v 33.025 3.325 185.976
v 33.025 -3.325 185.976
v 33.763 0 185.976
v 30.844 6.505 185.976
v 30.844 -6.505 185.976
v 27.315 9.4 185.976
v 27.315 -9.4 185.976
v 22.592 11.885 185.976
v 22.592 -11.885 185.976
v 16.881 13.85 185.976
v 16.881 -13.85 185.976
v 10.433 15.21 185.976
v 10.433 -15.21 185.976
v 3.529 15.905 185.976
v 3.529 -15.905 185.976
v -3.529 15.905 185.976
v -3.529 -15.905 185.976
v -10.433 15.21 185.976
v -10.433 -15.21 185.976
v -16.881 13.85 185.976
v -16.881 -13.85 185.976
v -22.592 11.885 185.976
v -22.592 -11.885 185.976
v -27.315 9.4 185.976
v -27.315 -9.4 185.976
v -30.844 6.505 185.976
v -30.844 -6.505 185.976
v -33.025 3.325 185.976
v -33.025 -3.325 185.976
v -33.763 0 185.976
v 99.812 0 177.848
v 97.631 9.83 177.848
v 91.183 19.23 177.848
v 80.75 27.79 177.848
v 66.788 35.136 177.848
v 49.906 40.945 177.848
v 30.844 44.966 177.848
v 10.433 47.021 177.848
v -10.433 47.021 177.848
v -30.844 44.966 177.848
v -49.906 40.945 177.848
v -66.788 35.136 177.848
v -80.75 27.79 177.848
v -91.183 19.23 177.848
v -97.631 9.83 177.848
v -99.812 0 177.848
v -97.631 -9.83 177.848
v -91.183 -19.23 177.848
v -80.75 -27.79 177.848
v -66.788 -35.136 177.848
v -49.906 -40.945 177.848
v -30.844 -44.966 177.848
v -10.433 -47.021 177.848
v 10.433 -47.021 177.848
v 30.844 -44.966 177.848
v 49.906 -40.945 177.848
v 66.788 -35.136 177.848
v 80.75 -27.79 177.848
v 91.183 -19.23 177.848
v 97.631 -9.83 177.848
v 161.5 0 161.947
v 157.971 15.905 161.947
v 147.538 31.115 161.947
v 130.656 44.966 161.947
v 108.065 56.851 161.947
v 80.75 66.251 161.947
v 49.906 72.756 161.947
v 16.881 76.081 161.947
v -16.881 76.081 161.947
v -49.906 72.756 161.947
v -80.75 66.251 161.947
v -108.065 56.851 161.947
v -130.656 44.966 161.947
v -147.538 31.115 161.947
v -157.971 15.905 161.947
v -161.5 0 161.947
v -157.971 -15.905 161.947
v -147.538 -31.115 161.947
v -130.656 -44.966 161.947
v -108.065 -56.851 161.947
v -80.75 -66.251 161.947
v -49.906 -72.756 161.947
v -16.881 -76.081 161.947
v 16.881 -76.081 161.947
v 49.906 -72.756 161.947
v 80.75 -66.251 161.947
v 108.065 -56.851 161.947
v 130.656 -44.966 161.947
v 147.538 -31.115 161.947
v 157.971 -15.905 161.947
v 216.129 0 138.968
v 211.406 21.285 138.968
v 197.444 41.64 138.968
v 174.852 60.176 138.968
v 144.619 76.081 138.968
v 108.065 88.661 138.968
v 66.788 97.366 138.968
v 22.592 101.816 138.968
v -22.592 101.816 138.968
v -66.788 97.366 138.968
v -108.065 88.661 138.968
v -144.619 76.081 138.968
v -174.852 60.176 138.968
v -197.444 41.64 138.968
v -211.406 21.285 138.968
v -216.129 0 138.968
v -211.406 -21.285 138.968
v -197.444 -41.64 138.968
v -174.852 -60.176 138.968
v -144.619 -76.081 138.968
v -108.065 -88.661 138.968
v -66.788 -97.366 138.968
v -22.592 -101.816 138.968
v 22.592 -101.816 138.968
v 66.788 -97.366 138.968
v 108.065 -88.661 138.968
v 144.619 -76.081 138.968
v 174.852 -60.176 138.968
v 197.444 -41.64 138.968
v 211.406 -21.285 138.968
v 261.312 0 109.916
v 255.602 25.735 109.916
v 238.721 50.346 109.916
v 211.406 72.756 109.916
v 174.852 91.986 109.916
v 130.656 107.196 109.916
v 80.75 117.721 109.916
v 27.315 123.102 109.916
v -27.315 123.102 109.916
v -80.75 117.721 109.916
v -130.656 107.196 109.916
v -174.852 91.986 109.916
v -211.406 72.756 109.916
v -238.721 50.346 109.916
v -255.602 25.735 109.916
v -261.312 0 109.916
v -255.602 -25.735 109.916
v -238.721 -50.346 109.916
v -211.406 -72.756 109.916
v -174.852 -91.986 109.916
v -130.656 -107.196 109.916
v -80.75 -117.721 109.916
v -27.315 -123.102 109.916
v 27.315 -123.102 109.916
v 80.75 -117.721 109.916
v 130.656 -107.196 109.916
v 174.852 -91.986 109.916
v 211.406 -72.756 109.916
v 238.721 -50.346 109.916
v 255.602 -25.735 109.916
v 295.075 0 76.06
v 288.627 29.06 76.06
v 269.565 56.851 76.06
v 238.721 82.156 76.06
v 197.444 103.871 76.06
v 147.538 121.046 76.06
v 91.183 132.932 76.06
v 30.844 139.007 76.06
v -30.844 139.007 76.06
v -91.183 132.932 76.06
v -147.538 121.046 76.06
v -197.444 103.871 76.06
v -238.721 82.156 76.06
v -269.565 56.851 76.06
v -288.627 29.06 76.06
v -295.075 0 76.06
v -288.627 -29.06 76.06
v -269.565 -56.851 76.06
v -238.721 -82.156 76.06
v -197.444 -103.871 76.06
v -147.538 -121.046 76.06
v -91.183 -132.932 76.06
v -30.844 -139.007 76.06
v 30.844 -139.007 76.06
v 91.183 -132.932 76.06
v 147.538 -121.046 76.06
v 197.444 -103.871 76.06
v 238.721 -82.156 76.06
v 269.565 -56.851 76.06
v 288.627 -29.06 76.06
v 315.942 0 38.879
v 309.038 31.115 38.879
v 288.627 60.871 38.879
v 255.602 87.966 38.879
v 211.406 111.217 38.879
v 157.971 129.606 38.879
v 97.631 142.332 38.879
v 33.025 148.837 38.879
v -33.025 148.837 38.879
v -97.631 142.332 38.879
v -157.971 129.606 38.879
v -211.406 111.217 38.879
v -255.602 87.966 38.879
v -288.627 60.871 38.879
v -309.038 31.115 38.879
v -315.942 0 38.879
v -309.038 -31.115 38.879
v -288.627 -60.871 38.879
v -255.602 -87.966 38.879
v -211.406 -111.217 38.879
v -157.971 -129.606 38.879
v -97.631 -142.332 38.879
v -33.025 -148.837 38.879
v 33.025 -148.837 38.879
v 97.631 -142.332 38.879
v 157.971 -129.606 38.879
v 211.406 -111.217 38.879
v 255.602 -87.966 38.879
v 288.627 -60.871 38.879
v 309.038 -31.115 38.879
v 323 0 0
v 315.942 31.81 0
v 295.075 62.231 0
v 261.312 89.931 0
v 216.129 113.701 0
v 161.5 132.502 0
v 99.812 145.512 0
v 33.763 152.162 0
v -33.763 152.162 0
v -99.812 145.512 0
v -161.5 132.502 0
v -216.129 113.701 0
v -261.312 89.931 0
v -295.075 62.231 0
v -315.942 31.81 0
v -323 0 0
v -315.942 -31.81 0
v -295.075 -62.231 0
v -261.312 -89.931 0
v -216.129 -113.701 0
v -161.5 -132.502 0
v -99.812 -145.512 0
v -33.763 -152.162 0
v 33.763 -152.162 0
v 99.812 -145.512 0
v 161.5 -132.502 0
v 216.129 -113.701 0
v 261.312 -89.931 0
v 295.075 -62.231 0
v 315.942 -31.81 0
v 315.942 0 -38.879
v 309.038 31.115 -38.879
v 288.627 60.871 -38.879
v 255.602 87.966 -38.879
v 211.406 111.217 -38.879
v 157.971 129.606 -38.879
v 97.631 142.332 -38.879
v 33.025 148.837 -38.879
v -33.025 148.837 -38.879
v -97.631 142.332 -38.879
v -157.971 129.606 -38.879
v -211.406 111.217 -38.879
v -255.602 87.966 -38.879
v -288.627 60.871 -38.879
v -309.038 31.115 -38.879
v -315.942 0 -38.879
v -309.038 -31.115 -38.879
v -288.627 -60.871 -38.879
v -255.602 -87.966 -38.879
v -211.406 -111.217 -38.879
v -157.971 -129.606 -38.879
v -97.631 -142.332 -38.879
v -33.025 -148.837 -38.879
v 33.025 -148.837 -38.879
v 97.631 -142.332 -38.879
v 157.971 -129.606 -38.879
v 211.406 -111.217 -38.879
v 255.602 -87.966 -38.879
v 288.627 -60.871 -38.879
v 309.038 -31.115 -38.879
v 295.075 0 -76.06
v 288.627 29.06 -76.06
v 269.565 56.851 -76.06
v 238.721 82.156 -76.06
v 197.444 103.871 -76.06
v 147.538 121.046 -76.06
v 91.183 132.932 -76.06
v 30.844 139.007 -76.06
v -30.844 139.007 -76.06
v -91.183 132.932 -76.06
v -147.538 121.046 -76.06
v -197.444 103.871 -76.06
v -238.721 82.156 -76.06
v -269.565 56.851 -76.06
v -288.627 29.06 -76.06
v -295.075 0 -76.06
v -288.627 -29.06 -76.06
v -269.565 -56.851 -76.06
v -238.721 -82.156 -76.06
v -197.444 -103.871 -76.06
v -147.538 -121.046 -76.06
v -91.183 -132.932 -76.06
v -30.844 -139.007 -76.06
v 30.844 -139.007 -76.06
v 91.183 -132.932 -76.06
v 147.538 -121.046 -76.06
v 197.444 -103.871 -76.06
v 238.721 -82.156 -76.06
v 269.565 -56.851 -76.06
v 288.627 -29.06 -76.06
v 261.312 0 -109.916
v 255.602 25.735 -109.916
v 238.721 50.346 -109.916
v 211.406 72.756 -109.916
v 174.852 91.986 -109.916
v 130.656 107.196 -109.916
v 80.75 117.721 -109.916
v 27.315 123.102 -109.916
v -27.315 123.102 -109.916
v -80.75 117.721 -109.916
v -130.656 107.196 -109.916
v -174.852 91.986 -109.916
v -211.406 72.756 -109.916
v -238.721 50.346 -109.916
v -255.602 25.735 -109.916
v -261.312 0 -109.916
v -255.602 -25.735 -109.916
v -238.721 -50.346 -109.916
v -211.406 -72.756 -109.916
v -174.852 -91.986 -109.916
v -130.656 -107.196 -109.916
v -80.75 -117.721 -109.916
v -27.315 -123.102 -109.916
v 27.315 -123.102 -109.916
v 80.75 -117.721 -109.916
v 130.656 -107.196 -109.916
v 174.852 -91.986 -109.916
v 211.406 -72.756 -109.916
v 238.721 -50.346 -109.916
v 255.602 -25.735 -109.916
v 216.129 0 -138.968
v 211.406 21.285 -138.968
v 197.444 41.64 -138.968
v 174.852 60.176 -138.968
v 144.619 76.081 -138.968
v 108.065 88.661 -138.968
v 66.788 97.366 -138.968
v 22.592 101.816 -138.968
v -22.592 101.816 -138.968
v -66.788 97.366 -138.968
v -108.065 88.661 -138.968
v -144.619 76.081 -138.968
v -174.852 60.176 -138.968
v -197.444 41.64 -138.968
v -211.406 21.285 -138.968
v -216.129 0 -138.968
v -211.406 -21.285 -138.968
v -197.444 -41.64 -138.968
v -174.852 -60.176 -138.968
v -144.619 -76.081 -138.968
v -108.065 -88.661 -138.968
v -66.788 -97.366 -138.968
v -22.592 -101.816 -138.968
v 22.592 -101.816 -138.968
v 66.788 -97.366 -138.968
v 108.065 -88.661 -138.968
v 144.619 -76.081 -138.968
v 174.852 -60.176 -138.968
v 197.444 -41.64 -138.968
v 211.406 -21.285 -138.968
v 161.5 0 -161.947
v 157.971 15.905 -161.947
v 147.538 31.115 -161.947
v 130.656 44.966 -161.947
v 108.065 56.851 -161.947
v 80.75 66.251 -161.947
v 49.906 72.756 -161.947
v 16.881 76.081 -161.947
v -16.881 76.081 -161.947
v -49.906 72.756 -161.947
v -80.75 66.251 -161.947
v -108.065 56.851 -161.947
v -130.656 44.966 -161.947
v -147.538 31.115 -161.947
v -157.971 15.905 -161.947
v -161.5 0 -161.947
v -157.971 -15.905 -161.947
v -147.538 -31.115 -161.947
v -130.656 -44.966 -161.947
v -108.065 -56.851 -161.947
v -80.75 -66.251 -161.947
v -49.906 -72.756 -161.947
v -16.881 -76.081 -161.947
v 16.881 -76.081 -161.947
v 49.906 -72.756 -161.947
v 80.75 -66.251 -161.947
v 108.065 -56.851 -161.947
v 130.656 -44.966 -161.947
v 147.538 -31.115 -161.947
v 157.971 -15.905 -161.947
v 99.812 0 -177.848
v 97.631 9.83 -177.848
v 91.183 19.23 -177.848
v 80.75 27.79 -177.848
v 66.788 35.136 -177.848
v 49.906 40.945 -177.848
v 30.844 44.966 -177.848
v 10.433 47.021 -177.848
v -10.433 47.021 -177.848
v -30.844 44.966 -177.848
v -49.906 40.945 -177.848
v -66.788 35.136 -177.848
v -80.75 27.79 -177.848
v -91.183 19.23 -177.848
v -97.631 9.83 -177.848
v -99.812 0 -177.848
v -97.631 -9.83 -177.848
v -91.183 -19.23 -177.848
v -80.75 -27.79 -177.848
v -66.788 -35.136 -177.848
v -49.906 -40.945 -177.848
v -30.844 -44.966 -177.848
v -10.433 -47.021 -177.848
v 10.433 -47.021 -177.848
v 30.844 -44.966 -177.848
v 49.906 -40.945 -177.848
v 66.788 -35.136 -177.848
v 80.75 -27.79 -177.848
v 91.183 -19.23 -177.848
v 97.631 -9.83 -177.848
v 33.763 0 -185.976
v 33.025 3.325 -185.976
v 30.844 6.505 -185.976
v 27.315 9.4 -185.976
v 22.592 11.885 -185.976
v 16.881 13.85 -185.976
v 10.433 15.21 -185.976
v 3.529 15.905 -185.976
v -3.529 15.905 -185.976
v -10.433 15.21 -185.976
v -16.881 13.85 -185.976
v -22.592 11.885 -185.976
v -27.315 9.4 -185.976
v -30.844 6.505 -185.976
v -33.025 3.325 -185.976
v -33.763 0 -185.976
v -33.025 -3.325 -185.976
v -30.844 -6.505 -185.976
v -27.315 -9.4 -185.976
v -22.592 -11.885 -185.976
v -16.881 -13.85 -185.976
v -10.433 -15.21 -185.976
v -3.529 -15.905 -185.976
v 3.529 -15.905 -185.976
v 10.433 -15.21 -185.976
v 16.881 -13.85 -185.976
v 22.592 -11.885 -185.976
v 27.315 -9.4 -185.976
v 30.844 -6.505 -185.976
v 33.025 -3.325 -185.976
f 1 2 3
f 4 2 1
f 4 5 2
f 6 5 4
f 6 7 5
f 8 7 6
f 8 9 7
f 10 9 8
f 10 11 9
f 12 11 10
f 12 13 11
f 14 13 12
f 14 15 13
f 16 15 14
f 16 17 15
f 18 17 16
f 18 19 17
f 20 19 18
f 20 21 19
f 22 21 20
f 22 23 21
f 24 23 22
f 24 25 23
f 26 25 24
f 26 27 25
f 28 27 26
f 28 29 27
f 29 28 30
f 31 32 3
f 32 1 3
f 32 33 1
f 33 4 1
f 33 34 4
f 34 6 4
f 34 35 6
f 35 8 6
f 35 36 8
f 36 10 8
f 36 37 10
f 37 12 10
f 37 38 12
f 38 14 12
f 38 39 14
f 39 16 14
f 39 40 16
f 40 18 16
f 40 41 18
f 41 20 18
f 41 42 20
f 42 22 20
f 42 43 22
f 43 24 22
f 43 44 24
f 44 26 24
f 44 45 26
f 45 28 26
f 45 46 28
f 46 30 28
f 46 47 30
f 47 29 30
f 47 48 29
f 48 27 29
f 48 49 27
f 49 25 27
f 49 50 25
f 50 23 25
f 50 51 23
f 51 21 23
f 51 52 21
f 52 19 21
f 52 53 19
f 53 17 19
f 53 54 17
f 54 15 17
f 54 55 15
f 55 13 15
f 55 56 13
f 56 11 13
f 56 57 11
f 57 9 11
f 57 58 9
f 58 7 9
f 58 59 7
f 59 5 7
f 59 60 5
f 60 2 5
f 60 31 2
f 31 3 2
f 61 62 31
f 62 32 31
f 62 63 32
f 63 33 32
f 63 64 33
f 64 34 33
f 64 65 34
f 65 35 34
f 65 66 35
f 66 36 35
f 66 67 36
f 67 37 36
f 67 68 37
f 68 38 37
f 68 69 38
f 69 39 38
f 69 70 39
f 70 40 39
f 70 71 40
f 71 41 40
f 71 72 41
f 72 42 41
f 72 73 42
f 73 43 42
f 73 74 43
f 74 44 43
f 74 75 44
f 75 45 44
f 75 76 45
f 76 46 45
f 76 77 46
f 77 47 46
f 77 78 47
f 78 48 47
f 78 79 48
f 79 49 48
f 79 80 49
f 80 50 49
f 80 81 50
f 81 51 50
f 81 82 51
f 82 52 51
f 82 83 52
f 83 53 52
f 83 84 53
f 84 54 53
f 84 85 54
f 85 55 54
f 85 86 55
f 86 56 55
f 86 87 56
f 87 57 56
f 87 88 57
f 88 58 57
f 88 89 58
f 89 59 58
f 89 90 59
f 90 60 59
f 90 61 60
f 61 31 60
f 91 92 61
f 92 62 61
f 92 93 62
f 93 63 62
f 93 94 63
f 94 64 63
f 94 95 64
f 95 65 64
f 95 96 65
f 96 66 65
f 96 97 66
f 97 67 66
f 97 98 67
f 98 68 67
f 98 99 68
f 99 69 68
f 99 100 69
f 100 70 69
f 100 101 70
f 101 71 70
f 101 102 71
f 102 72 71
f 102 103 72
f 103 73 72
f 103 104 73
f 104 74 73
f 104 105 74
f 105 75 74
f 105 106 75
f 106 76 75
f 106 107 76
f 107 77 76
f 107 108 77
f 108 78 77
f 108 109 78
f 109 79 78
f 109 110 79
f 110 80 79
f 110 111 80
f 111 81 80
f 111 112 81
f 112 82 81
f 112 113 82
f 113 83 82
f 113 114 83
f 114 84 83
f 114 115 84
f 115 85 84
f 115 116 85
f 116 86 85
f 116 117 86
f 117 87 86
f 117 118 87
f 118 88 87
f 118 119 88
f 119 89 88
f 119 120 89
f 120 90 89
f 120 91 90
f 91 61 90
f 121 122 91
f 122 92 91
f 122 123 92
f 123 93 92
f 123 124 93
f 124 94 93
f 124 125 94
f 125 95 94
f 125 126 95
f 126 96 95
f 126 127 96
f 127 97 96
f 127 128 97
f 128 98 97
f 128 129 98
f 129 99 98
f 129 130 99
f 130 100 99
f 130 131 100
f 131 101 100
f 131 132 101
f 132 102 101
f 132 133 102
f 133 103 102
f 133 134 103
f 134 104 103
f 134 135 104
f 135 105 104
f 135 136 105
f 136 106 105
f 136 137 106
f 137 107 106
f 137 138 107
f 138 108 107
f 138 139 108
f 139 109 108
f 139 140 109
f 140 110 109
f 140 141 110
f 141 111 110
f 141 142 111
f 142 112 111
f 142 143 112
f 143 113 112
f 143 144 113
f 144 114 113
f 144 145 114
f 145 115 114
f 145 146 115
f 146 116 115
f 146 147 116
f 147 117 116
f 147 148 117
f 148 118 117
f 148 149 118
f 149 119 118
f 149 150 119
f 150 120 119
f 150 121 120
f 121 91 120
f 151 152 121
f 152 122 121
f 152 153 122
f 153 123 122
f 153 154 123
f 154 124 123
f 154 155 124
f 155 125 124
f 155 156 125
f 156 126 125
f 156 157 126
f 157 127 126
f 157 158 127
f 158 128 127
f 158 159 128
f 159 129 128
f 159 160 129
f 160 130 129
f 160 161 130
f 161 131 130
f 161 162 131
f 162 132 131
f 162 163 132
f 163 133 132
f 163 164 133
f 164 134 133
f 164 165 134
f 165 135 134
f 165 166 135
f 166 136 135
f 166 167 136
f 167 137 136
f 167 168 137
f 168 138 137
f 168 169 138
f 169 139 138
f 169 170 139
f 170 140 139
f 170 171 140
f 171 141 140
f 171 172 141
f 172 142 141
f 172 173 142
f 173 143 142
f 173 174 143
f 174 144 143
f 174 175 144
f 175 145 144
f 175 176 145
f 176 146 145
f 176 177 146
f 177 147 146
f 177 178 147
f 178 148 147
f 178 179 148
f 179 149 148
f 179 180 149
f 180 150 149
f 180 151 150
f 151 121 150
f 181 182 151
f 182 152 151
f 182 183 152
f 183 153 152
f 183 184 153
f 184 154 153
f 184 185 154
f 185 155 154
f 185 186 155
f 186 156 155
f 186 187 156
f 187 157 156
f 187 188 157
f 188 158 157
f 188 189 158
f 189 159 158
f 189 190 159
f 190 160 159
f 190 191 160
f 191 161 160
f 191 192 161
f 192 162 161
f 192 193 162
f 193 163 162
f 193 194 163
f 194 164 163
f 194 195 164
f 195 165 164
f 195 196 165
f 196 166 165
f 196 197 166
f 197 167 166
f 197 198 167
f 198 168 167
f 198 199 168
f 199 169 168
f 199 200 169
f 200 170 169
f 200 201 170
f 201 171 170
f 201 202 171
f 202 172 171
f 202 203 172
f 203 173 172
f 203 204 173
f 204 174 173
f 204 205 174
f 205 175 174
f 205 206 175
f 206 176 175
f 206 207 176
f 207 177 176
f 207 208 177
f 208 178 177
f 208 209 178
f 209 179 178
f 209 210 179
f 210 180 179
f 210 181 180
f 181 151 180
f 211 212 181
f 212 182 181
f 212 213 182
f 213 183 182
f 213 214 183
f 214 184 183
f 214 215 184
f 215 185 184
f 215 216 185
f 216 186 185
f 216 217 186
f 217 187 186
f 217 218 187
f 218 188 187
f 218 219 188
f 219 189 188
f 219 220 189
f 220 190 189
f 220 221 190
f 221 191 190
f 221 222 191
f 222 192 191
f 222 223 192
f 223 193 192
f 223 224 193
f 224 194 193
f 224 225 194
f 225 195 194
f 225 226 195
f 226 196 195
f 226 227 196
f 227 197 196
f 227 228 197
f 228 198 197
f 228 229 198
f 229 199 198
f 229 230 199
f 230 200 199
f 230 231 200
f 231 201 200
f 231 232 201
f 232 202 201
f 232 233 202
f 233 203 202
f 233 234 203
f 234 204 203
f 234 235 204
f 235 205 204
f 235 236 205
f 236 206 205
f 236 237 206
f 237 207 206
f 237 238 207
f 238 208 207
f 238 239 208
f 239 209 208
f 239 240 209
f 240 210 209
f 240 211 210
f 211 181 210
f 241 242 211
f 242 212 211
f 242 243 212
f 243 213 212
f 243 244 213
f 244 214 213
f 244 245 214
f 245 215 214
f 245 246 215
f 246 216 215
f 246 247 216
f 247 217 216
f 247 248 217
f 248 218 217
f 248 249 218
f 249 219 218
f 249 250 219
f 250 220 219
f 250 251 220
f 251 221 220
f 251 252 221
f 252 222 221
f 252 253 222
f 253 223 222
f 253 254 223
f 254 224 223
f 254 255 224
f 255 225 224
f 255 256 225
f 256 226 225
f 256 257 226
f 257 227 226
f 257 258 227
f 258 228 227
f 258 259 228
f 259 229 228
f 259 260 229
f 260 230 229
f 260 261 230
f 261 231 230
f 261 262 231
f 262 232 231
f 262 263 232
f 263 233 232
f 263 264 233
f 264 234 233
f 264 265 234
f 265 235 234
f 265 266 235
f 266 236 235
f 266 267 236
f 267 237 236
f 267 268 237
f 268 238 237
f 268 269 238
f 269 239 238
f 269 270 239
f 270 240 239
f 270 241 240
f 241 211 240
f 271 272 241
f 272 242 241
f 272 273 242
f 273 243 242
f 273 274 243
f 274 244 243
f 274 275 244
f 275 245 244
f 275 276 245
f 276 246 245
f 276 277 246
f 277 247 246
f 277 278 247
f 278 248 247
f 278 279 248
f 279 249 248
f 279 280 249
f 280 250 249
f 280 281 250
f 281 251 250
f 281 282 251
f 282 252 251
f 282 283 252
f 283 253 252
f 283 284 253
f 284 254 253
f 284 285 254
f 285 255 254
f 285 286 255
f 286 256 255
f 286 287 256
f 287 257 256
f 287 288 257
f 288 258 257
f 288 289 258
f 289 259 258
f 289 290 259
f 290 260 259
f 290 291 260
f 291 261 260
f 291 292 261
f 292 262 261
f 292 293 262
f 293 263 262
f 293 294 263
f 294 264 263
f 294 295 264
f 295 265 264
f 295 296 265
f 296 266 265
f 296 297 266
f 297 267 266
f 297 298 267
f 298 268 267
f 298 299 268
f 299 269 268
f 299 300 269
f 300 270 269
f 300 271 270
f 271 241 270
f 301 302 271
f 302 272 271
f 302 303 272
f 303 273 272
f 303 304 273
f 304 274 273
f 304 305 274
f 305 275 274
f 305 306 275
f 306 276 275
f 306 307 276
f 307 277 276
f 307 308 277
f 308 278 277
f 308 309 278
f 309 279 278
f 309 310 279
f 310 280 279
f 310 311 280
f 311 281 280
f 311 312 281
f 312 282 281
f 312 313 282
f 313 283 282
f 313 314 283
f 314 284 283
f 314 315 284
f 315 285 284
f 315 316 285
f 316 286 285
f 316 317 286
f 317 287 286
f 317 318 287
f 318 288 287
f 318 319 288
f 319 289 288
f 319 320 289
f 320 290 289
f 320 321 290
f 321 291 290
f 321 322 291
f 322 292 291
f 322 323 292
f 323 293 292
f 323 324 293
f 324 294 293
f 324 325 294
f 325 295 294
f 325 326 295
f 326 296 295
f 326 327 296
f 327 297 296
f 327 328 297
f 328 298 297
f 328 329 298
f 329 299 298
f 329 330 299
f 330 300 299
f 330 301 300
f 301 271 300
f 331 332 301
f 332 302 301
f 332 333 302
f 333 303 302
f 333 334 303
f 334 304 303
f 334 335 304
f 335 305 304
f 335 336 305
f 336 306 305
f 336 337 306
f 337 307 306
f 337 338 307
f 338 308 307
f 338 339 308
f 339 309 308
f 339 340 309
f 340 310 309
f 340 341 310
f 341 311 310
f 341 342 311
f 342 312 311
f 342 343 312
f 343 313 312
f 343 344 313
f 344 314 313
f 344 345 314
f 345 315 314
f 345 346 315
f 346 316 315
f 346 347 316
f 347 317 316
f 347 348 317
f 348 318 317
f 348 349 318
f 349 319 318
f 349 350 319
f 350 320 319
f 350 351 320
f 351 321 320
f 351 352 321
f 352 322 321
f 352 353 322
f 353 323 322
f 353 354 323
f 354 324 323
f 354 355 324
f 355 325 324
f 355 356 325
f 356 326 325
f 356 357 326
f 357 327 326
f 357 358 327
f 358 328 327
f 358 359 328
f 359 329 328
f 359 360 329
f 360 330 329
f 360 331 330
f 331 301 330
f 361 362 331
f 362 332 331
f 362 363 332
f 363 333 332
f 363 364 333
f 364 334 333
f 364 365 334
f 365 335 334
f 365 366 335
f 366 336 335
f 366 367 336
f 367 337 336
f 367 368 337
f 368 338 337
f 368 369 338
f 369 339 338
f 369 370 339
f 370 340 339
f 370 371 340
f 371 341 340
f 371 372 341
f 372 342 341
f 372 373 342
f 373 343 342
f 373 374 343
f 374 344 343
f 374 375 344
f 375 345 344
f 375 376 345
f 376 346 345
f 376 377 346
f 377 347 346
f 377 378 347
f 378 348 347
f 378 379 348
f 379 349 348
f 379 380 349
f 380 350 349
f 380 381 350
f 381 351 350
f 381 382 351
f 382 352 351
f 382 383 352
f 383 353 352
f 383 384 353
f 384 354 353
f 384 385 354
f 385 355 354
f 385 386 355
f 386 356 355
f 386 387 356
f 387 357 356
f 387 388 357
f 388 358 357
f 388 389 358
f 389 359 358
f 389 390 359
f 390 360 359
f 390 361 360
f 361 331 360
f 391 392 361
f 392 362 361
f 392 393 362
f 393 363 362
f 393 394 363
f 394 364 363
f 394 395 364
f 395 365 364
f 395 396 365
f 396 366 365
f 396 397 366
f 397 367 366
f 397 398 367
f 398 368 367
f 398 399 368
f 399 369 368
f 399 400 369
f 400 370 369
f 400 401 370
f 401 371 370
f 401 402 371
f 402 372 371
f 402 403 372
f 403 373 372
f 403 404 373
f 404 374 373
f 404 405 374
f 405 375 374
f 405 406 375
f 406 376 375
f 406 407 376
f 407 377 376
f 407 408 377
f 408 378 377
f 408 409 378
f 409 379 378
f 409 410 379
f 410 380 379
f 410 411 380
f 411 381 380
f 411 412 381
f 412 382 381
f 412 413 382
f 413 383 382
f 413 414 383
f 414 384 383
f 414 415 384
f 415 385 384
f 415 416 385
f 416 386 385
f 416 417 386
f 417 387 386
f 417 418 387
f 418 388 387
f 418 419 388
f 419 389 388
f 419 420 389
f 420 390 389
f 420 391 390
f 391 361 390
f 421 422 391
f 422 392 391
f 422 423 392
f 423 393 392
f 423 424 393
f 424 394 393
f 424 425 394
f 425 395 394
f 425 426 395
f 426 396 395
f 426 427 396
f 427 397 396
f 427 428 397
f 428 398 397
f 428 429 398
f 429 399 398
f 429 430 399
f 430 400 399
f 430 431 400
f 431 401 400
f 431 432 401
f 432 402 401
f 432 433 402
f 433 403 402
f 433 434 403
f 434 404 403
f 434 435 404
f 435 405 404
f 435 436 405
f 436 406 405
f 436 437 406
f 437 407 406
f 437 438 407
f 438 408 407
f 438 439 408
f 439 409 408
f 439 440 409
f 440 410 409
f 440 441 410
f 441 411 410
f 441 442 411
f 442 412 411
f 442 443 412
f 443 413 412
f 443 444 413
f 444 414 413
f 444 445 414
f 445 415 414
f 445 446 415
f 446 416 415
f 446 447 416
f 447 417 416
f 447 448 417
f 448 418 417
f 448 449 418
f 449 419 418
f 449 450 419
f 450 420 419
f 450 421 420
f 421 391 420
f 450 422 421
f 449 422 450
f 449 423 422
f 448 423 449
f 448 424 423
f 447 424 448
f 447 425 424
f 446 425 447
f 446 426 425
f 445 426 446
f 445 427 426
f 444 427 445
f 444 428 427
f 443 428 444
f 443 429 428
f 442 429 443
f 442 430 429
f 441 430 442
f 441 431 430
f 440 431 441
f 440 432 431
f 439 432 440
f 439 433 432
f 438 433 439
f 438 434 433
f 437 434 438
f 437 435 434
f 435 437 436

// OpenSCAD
// Generated by SolidPython 1.0.1 on 2020-07-29 00:46:54


scale(v = [19, 9, 11]) {
	sphere(r = 17);
}
/***********************************************
*********      SolidPython code:      **********
************************************************
 
# import packages: SolidPython
from solid import *
from solid.utils import *
from itertools import chain, combinations, permutations


class Resize:

    def __init__(self, scad_file):
        self.scad_file = scad_file
        #self.scad_file = import_scad(scad_file)
        # cone/cylinder param:
        self.r1 = 0
        self.r2 = 0
        self.h = 0
        # rectangular prism param:
        self.w = 0
        self.l = 0
        # ellipse param:
        self.r = 0

    # import OpenScad code (file name corresponds to shape)


    # classify shape + parameters
    def assign(self, param1, param2, param3):
        if self.scad_file == 'cone.scad':
            self.r1 = param1
            self.r2 = param2
            self.h = param3
        elif self.scad_file == 'cylinder.scad':
            self.r1 = param1
            self.r2 = param2
            self.h = param3
        elif self.scad_file == 'rectangularPrism.scad':
            self.h = param1
            self.l = param2
            self.w = param3
        else:
            self.r = param1
            self.h = param2

    # resize parameters
    def iterate(self):
        x = range(3, 20, 2)
        i = 1
        if self.scad_file == 'cone.scad':
            tempList = list(permutations(x, 2))
            for temp in tempList:
                param1 = temp[0]
                param2 = temp[1]
                filepath = 'produced_scad_files/' + 'cone' + str(param1) + '_' + str(param2) + '_' + '.scad'
                scad_render_to_file(cylinder(h=param1, r1=param2, r2=0), filepath)

        elif self.scad_file == 'cylinder.scad':
            tempList = list(permutations(x, 3))
            for temp in tempList:
                param1 = temp[0]
                param2 = temp[1]
                filepath = 'produced_scad_files/' + 'cylinder' + str(param1) + '_' + str(param2) + '_' + '.scad'
                scad_render_to_file(cylinder(h=param1, r1=param2, r2=param2), filepath)

        elif self.scad_file == 'rectangularPrism.scad':
            tempList = list(permutations(x, 3))
            for temp in tempList:
                param1 = temp[0]
                param2 = temp[1]
                param3 = temp[2]
                filepath = 'produced_scad_files/' + 'rectangularPrism' + str(param1) + '_' + str(param2) + '_' + str(
                    param3) + '.scad'
                scad_render_to_file(cube(size=(param1, param2, param3)), filepath)

        elif self.scad_file == 'ellipse.scad':
            tempList = list(permutations(x, 4))
            for temp in tempList:
                param1 = temp[0]
                param2 = temp[1]
                param3 = temp[2]
                param4 = temp[3]
                filepath = 'produced_scad_files/' + 'ellipse' + str(param1) + '_' + str(param2) + '_' + str(param3) + '_' + str(param4) + '.scad'
                scad_render_to_file(scale([param1, param2, param3])(sphere(r=param4)), filepath)

    def render_to_scadfile(self):
        scad_render_to_file(scad, 'example.scad') 
 
************************************************/
